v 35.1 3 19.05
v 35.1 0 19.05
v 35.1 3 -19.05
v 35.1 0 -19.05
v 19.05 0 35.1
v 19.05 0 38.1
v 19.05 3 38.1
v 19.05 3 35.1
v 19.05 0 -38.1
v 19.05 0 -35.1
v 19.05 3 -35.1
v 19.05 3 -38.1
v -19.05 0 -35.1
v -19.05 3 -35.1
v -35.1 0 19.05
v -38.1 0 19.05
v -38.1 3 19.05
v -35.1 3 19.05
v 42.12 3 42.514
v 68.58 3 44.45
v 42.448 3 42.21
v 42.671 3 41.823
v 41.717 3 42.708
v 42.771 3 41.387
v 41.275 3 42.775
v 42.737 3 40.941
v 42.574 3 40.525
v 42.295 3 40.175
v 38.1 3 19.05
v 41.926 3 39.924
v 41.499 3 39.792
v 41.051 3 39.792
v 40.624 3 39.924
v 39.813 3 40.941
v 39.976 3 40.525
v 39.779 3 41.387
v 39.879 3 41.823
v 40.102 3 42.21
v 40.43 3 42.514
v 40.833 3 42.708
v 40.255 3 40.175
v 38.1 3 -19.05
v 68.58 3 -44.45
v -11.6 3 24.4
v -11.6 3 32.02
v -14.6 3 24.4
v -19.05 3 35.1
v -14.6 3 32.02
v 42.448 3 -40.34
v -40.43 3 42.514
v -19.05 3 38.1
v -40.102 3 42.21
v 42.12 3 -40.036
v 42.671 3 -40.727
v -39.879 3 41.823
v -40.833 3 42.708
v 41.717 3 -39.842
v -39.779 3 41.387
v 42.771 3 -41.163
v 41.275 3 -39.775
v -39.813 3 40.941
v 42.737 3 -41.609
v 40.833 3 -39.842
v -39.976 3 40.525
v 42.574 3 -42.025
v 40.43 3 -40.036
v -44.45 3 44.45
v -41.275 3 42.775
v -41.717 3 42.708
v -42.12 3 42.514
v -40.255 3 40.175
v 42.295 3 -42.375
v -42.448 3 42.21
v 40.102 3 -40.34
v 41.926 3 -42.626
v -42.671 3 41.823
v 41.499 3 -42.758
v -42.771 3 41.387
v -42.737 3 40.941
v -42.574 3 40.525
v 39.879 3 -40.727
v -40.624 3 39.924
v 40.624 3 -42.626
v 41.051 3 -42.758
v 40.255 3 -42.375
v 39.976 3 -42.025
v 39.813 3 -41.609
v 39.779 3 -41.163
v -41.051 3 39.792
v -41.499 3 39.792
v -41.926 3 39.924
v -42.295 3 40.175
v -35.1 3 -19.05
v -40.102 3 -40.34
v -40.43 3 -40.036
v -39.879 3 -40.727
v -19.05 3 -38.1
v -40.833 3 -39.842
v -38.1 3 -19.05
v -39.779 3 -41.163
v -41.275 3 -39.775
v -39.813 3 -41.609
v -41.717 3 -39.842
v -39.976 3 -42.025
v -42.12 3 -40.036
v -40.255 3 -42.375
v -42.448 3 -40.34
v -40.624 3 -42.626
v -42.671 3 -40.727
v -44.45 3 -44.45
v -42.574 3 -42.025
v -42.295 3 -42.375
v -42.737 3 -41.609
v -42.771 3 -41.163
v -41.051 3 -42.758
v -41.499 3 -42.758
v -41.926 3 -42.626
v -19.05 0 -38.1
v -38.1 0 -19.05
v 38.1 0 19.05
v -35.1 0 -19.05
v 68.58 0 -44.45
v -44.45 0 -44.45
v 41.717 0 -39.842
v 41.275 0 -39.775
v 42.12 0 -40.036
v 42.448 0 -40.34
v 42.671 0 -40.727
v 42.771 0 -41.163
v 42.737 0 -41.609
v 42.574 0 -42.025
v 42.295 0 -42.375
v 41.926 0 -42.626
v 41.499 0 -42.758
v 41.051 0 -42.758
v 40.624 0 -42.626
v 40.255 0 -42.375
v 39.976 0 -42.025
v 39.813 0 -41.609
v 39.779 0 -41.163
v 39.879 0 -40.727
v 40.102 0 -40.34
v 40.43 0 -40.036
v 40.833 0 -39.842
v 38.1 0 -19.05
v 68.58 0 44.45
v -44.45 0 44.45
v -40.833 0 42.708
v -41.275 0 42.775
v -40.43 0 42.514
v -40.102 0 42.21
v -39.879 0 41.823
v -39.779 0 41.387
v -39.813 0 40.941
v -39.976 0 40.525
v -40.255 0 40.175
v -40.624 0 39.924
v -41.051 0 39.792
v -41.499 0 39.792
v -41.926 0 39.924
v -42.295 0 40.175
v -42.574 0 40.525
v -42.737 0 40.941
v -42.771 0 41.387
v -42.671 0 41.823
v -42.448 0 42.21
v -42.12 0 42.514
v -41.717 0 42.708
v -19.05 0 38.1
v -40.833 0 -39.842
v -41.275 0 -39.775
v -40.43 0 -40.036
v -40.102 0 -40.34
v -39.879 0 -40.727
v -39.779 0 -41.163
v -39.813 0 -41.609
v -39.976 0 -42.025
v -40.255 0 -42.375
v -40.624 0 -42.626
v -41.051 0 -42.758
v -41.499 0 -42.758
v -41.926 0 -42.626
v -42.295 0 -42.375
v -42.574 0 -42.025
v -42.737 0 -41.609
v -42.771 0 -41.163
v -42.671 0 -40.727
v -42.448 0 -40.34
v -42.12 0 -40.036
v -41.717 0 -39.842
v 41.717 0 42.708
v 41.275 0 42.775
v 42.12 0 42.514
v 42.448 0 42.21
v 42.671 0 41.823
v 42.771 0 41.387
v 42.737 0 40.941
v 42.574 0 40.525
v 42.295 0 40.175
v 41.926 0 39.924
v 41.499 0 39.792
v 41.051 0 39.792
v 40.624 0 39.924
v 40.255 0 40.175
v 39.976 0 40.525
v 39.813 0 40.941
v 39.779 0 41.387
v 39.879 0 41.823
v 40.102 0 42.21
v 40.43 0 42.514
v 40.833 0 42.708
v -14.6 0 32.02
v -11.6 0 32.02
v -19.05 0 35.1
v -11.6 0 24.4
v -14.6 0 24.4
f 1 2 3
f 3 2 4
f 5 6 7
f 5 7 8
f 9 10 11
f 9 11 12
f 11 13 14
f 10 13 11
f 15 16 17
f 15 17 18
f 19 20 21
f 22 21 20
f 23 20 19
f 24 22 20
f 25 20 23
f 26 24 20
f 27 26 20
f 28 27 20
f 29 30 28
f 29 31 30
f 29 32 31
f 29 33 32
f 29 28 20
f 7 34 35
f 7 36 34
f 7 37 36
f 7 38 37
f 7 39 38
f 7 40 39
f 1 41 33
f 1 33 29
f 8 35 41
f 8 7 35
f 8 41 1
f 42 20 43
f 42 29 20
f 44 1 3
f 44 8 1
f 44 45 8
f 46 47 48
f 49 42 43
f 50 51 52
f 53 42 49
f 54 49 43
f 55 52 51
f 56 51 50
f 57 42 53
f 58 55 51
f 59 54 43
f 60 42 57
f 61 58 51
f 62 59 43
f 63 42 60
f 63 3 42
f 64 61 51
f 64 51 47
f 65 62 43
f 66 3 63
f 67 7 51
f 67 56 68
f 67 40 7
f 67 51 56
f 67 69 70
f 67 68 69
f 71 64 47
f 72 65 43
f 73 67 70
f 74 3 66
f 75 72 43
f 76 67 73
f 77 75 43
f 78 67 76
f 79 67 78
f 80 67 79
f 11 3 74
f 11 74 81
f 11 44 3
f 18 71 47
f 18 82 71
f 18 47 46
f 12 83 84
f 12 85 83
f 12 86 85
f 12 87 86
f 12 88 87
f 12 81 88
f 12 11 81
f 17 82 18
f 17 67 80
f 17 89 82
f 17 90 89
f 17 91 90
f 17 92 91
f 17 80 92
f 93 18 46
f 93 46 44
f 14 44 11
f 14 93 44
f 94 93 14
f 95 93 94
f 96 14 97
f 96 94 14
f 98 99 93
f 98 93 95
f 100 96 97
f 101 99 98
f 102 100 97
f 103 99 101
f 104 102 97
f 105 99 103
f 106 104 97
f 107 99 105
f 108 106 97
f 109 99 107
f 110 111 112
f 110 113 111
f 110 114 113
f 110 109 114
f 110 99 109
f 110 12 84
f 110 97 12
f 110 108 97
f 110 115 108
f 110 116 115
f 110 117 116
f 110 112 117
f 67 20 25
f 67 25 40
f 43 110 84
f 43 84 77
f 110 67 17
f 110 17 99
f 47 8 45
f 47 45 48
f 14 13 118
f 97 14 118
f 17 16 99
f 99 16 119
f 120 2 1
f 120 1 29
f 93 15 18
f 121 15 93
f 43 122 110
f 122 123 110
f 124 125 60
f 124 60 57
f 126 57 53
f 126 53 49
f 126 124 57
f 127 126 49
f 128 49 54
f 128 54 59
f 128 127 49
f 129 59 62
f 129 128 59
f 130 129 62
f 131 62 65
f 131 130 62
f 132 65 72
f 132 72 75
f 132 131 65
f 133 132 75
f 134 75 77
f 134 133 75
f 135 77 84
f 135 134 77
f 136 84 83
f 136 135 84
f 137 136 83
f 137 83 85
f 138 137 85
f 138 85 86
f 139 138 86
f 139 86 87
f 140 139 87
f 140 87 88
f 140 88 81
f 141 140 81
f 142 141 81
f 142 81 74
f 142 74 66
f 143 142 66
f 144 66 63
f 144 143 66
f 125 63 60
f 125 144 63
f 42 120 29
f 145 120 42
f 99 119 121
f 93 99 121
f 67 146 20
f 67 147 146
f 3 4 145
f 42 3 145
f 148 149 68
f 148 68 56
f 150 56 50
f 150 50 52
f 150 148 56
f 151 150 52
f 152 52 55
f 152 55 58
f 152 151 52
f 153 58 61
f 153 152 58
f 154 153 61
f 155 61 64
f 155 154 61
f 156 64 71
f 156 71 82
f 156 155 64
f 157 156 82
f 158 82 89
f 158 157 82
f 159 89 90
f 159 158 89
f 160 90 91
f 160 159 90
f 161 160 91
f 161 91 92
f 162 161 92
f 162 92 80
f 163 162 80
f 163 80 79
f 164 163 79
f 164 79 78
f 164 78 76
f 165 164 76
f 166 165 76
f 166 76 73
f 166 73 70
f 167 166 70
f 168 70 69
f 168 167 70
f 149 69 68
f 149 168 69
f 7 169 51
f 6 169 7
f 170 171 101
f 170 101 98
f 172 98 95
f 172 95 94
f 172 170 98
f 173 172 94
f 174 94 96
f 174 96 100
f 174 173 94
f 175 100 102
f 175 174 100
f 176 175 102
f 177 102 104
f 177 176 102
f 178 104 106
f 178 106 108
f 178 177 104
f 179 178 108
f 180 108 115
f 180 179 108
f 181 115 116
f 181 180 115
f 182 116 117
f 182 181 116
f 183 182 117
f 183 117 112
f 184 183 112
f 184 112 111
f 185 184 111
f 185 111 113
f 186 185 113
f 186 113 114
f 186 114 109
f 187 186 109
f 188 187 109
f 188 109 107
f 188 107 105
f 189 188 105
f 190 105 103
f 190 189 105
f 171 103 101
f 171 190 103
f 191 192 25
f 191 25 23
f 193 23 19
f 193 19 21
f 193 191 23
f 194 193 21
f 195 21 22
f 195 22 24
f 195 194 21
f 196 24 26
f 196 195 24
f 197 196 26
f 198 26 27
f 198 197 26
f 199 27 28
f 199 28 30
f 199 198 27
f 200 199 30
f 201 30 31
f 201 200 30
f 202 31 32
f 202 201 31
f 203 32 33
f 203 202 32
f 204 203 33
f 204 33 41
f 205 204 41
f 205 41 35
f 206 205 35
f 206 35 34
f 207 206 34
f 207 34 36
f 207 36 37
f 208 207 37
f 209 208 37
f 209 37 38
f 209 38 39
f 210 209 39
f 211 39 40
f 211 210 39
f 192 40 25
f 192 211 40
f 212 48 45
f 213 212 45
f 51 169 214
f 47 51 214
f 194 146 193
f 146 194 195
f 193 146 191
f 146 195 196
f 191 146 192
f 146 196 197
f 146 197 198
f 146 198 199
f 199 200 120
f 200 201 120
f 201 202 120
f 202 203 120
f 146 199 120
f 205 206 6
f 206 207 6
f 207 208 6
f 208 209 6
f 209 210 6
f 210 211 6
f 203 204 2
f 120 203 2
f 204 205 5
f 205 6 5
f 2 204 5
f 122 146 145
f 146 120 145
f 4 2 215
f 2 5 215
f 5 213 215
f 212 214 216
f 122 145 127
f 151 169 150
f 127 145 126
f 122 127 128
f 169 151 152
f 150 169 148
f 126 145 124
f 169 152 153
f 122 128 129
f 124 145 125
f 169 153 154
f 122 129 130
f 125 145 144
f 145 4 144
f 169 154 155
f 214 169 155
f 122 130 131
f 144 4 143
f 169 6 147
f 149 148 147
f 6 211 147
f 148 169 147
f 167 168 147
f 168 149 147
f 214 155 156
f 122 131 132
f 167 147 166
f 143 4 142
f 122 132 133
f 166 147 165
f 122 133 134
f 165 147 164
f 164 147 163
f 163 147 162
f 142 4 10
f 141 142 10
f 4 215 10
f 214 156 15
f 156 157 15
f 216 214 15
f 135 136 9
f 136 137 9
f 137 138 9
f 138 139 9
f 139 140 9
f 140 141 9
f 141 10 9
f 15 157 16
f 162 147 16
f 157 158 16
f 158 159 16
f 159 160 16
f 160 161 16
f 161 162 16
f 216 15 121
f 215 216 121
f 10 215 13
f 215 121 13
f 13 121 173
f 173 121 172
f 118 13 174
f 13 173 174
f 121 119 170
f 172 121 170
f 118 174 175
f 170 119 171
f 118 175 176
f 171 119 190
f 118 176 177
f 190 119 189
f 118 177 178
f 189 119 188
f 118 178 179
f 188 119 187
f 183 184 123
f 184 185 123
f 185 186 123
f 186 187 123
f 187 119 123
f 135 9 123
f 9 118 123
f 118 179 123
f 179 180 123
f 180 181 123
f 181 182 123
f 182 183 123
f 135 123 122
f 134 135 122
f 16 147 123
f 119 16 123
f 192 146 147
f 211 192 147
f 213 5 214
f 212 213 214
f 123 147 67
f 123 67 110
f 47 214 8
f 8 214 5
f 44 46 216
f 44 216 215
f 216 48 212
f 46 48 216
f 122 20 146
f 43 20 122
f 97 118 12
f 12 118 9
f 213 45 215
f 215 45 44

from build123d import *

# Parameters (mm, degrees)
SKETCH_4_W          = 88.9
SKETCH_4_H          = 88.9
SKETCH_4_R          = 1.5
SKETCH_4_W_2        = 38.1
SKETCH_4_H_2        = 3
SKETCH_4_W_3        = 3
SKETCH_4_H_3        = 38.1
EXTRUDE_1_DEPTH     = 3
SKETCH_6_W          = 88.9
SKETCH_6_H          = 3
EXTRUDE_2_DEPTH     = 24.13
SKETCH_7_W          = 3
SKETCH_7_H          = 7.62
CUT_EXTRUDE_1_DEPTH = 3


with BuildPart() as part:
    # 스케치4 → 보스-돌출1 (new body)
    with BuildSketch(Plane(origin=(0, 0, 0), x_dir=(1, 0, 0), z_dir=(0, 1, 0))):
        Rectangle(SKETCH_4_W, SKETCH_4_H)
        with Locations(Location((-41.275, 41.275, 0), (0, 0, 270))):
            Circle(SKETCH_4_R, mode=Mode.SUBTRACT)
        with Locations(Location((41.275, 41.275, 0), (0, 0, 270))):
            Circle(SKETCH_4_R, mode=Mode.SUBTRACT)
        with Locations(Location((41.275, -41.275, 0), (0, 0, 270))):
            Circle(SKETCH_4_R, mode=Mode.SUBTRACT)
        with Locations(Location((-41.275, -41.275, 0), (0, 0, 270))):
            Circle(SKETCH_4_R, mode=Mode.SUBTRACT)
        with Locations((0, 36.6)):
            Rectangle(SKETCH_4_W_2, SKETCH_4_H_2, mode=Mode.SUBTRACT)
        with Locations((36.6, 0)):
            Rectangle(SKETCH_4_W_3, SKETCH_4_H_3, mode=Mode.SUBTRACT)
        with Locations((0, -36.6)):
            Rectangle(SKETCH_4_W_2, SKETCH_4_H_2, mode=Mode.SUBTRACT)
        with Locations((-36.6, 0)):
            Rectangle(SKETCH_4_W_3, SKETCH_4_H_3, mode=Mode.SUBTRACT)
    extrude(amount=EXTRUDE_1_DEPTH)

    # 스케치6 → 보스-돌출2 (add)
    with BuildSketch(Plane(origin=(44.45, 0, 0), x_dir=(0, 0, -1), z_dir=(1, 0, 0))):
        with Locations((0, 1.5)):
            Rectangle(SKETCH_6_W, SKETCH_6_H)
    extrude(amount=EXTRUDE_2_DEPTH)

    # 스케치7 → 컷-돌출1 (cut)
    with BuildSketch(Plane(origin=(0, 3, 0), x_dir=(1, 0, 0), z_dir=(0, 1, 0))):
        with Locations((-13.1, -28.21025)):
            Rectangle(SKETCH_7_W, SKETCH_7_H)
    extrude(amount=-CUT_EXTRUDE_1_DEPTH, mode=Mode.SUBTRACT)


solid = part.part
